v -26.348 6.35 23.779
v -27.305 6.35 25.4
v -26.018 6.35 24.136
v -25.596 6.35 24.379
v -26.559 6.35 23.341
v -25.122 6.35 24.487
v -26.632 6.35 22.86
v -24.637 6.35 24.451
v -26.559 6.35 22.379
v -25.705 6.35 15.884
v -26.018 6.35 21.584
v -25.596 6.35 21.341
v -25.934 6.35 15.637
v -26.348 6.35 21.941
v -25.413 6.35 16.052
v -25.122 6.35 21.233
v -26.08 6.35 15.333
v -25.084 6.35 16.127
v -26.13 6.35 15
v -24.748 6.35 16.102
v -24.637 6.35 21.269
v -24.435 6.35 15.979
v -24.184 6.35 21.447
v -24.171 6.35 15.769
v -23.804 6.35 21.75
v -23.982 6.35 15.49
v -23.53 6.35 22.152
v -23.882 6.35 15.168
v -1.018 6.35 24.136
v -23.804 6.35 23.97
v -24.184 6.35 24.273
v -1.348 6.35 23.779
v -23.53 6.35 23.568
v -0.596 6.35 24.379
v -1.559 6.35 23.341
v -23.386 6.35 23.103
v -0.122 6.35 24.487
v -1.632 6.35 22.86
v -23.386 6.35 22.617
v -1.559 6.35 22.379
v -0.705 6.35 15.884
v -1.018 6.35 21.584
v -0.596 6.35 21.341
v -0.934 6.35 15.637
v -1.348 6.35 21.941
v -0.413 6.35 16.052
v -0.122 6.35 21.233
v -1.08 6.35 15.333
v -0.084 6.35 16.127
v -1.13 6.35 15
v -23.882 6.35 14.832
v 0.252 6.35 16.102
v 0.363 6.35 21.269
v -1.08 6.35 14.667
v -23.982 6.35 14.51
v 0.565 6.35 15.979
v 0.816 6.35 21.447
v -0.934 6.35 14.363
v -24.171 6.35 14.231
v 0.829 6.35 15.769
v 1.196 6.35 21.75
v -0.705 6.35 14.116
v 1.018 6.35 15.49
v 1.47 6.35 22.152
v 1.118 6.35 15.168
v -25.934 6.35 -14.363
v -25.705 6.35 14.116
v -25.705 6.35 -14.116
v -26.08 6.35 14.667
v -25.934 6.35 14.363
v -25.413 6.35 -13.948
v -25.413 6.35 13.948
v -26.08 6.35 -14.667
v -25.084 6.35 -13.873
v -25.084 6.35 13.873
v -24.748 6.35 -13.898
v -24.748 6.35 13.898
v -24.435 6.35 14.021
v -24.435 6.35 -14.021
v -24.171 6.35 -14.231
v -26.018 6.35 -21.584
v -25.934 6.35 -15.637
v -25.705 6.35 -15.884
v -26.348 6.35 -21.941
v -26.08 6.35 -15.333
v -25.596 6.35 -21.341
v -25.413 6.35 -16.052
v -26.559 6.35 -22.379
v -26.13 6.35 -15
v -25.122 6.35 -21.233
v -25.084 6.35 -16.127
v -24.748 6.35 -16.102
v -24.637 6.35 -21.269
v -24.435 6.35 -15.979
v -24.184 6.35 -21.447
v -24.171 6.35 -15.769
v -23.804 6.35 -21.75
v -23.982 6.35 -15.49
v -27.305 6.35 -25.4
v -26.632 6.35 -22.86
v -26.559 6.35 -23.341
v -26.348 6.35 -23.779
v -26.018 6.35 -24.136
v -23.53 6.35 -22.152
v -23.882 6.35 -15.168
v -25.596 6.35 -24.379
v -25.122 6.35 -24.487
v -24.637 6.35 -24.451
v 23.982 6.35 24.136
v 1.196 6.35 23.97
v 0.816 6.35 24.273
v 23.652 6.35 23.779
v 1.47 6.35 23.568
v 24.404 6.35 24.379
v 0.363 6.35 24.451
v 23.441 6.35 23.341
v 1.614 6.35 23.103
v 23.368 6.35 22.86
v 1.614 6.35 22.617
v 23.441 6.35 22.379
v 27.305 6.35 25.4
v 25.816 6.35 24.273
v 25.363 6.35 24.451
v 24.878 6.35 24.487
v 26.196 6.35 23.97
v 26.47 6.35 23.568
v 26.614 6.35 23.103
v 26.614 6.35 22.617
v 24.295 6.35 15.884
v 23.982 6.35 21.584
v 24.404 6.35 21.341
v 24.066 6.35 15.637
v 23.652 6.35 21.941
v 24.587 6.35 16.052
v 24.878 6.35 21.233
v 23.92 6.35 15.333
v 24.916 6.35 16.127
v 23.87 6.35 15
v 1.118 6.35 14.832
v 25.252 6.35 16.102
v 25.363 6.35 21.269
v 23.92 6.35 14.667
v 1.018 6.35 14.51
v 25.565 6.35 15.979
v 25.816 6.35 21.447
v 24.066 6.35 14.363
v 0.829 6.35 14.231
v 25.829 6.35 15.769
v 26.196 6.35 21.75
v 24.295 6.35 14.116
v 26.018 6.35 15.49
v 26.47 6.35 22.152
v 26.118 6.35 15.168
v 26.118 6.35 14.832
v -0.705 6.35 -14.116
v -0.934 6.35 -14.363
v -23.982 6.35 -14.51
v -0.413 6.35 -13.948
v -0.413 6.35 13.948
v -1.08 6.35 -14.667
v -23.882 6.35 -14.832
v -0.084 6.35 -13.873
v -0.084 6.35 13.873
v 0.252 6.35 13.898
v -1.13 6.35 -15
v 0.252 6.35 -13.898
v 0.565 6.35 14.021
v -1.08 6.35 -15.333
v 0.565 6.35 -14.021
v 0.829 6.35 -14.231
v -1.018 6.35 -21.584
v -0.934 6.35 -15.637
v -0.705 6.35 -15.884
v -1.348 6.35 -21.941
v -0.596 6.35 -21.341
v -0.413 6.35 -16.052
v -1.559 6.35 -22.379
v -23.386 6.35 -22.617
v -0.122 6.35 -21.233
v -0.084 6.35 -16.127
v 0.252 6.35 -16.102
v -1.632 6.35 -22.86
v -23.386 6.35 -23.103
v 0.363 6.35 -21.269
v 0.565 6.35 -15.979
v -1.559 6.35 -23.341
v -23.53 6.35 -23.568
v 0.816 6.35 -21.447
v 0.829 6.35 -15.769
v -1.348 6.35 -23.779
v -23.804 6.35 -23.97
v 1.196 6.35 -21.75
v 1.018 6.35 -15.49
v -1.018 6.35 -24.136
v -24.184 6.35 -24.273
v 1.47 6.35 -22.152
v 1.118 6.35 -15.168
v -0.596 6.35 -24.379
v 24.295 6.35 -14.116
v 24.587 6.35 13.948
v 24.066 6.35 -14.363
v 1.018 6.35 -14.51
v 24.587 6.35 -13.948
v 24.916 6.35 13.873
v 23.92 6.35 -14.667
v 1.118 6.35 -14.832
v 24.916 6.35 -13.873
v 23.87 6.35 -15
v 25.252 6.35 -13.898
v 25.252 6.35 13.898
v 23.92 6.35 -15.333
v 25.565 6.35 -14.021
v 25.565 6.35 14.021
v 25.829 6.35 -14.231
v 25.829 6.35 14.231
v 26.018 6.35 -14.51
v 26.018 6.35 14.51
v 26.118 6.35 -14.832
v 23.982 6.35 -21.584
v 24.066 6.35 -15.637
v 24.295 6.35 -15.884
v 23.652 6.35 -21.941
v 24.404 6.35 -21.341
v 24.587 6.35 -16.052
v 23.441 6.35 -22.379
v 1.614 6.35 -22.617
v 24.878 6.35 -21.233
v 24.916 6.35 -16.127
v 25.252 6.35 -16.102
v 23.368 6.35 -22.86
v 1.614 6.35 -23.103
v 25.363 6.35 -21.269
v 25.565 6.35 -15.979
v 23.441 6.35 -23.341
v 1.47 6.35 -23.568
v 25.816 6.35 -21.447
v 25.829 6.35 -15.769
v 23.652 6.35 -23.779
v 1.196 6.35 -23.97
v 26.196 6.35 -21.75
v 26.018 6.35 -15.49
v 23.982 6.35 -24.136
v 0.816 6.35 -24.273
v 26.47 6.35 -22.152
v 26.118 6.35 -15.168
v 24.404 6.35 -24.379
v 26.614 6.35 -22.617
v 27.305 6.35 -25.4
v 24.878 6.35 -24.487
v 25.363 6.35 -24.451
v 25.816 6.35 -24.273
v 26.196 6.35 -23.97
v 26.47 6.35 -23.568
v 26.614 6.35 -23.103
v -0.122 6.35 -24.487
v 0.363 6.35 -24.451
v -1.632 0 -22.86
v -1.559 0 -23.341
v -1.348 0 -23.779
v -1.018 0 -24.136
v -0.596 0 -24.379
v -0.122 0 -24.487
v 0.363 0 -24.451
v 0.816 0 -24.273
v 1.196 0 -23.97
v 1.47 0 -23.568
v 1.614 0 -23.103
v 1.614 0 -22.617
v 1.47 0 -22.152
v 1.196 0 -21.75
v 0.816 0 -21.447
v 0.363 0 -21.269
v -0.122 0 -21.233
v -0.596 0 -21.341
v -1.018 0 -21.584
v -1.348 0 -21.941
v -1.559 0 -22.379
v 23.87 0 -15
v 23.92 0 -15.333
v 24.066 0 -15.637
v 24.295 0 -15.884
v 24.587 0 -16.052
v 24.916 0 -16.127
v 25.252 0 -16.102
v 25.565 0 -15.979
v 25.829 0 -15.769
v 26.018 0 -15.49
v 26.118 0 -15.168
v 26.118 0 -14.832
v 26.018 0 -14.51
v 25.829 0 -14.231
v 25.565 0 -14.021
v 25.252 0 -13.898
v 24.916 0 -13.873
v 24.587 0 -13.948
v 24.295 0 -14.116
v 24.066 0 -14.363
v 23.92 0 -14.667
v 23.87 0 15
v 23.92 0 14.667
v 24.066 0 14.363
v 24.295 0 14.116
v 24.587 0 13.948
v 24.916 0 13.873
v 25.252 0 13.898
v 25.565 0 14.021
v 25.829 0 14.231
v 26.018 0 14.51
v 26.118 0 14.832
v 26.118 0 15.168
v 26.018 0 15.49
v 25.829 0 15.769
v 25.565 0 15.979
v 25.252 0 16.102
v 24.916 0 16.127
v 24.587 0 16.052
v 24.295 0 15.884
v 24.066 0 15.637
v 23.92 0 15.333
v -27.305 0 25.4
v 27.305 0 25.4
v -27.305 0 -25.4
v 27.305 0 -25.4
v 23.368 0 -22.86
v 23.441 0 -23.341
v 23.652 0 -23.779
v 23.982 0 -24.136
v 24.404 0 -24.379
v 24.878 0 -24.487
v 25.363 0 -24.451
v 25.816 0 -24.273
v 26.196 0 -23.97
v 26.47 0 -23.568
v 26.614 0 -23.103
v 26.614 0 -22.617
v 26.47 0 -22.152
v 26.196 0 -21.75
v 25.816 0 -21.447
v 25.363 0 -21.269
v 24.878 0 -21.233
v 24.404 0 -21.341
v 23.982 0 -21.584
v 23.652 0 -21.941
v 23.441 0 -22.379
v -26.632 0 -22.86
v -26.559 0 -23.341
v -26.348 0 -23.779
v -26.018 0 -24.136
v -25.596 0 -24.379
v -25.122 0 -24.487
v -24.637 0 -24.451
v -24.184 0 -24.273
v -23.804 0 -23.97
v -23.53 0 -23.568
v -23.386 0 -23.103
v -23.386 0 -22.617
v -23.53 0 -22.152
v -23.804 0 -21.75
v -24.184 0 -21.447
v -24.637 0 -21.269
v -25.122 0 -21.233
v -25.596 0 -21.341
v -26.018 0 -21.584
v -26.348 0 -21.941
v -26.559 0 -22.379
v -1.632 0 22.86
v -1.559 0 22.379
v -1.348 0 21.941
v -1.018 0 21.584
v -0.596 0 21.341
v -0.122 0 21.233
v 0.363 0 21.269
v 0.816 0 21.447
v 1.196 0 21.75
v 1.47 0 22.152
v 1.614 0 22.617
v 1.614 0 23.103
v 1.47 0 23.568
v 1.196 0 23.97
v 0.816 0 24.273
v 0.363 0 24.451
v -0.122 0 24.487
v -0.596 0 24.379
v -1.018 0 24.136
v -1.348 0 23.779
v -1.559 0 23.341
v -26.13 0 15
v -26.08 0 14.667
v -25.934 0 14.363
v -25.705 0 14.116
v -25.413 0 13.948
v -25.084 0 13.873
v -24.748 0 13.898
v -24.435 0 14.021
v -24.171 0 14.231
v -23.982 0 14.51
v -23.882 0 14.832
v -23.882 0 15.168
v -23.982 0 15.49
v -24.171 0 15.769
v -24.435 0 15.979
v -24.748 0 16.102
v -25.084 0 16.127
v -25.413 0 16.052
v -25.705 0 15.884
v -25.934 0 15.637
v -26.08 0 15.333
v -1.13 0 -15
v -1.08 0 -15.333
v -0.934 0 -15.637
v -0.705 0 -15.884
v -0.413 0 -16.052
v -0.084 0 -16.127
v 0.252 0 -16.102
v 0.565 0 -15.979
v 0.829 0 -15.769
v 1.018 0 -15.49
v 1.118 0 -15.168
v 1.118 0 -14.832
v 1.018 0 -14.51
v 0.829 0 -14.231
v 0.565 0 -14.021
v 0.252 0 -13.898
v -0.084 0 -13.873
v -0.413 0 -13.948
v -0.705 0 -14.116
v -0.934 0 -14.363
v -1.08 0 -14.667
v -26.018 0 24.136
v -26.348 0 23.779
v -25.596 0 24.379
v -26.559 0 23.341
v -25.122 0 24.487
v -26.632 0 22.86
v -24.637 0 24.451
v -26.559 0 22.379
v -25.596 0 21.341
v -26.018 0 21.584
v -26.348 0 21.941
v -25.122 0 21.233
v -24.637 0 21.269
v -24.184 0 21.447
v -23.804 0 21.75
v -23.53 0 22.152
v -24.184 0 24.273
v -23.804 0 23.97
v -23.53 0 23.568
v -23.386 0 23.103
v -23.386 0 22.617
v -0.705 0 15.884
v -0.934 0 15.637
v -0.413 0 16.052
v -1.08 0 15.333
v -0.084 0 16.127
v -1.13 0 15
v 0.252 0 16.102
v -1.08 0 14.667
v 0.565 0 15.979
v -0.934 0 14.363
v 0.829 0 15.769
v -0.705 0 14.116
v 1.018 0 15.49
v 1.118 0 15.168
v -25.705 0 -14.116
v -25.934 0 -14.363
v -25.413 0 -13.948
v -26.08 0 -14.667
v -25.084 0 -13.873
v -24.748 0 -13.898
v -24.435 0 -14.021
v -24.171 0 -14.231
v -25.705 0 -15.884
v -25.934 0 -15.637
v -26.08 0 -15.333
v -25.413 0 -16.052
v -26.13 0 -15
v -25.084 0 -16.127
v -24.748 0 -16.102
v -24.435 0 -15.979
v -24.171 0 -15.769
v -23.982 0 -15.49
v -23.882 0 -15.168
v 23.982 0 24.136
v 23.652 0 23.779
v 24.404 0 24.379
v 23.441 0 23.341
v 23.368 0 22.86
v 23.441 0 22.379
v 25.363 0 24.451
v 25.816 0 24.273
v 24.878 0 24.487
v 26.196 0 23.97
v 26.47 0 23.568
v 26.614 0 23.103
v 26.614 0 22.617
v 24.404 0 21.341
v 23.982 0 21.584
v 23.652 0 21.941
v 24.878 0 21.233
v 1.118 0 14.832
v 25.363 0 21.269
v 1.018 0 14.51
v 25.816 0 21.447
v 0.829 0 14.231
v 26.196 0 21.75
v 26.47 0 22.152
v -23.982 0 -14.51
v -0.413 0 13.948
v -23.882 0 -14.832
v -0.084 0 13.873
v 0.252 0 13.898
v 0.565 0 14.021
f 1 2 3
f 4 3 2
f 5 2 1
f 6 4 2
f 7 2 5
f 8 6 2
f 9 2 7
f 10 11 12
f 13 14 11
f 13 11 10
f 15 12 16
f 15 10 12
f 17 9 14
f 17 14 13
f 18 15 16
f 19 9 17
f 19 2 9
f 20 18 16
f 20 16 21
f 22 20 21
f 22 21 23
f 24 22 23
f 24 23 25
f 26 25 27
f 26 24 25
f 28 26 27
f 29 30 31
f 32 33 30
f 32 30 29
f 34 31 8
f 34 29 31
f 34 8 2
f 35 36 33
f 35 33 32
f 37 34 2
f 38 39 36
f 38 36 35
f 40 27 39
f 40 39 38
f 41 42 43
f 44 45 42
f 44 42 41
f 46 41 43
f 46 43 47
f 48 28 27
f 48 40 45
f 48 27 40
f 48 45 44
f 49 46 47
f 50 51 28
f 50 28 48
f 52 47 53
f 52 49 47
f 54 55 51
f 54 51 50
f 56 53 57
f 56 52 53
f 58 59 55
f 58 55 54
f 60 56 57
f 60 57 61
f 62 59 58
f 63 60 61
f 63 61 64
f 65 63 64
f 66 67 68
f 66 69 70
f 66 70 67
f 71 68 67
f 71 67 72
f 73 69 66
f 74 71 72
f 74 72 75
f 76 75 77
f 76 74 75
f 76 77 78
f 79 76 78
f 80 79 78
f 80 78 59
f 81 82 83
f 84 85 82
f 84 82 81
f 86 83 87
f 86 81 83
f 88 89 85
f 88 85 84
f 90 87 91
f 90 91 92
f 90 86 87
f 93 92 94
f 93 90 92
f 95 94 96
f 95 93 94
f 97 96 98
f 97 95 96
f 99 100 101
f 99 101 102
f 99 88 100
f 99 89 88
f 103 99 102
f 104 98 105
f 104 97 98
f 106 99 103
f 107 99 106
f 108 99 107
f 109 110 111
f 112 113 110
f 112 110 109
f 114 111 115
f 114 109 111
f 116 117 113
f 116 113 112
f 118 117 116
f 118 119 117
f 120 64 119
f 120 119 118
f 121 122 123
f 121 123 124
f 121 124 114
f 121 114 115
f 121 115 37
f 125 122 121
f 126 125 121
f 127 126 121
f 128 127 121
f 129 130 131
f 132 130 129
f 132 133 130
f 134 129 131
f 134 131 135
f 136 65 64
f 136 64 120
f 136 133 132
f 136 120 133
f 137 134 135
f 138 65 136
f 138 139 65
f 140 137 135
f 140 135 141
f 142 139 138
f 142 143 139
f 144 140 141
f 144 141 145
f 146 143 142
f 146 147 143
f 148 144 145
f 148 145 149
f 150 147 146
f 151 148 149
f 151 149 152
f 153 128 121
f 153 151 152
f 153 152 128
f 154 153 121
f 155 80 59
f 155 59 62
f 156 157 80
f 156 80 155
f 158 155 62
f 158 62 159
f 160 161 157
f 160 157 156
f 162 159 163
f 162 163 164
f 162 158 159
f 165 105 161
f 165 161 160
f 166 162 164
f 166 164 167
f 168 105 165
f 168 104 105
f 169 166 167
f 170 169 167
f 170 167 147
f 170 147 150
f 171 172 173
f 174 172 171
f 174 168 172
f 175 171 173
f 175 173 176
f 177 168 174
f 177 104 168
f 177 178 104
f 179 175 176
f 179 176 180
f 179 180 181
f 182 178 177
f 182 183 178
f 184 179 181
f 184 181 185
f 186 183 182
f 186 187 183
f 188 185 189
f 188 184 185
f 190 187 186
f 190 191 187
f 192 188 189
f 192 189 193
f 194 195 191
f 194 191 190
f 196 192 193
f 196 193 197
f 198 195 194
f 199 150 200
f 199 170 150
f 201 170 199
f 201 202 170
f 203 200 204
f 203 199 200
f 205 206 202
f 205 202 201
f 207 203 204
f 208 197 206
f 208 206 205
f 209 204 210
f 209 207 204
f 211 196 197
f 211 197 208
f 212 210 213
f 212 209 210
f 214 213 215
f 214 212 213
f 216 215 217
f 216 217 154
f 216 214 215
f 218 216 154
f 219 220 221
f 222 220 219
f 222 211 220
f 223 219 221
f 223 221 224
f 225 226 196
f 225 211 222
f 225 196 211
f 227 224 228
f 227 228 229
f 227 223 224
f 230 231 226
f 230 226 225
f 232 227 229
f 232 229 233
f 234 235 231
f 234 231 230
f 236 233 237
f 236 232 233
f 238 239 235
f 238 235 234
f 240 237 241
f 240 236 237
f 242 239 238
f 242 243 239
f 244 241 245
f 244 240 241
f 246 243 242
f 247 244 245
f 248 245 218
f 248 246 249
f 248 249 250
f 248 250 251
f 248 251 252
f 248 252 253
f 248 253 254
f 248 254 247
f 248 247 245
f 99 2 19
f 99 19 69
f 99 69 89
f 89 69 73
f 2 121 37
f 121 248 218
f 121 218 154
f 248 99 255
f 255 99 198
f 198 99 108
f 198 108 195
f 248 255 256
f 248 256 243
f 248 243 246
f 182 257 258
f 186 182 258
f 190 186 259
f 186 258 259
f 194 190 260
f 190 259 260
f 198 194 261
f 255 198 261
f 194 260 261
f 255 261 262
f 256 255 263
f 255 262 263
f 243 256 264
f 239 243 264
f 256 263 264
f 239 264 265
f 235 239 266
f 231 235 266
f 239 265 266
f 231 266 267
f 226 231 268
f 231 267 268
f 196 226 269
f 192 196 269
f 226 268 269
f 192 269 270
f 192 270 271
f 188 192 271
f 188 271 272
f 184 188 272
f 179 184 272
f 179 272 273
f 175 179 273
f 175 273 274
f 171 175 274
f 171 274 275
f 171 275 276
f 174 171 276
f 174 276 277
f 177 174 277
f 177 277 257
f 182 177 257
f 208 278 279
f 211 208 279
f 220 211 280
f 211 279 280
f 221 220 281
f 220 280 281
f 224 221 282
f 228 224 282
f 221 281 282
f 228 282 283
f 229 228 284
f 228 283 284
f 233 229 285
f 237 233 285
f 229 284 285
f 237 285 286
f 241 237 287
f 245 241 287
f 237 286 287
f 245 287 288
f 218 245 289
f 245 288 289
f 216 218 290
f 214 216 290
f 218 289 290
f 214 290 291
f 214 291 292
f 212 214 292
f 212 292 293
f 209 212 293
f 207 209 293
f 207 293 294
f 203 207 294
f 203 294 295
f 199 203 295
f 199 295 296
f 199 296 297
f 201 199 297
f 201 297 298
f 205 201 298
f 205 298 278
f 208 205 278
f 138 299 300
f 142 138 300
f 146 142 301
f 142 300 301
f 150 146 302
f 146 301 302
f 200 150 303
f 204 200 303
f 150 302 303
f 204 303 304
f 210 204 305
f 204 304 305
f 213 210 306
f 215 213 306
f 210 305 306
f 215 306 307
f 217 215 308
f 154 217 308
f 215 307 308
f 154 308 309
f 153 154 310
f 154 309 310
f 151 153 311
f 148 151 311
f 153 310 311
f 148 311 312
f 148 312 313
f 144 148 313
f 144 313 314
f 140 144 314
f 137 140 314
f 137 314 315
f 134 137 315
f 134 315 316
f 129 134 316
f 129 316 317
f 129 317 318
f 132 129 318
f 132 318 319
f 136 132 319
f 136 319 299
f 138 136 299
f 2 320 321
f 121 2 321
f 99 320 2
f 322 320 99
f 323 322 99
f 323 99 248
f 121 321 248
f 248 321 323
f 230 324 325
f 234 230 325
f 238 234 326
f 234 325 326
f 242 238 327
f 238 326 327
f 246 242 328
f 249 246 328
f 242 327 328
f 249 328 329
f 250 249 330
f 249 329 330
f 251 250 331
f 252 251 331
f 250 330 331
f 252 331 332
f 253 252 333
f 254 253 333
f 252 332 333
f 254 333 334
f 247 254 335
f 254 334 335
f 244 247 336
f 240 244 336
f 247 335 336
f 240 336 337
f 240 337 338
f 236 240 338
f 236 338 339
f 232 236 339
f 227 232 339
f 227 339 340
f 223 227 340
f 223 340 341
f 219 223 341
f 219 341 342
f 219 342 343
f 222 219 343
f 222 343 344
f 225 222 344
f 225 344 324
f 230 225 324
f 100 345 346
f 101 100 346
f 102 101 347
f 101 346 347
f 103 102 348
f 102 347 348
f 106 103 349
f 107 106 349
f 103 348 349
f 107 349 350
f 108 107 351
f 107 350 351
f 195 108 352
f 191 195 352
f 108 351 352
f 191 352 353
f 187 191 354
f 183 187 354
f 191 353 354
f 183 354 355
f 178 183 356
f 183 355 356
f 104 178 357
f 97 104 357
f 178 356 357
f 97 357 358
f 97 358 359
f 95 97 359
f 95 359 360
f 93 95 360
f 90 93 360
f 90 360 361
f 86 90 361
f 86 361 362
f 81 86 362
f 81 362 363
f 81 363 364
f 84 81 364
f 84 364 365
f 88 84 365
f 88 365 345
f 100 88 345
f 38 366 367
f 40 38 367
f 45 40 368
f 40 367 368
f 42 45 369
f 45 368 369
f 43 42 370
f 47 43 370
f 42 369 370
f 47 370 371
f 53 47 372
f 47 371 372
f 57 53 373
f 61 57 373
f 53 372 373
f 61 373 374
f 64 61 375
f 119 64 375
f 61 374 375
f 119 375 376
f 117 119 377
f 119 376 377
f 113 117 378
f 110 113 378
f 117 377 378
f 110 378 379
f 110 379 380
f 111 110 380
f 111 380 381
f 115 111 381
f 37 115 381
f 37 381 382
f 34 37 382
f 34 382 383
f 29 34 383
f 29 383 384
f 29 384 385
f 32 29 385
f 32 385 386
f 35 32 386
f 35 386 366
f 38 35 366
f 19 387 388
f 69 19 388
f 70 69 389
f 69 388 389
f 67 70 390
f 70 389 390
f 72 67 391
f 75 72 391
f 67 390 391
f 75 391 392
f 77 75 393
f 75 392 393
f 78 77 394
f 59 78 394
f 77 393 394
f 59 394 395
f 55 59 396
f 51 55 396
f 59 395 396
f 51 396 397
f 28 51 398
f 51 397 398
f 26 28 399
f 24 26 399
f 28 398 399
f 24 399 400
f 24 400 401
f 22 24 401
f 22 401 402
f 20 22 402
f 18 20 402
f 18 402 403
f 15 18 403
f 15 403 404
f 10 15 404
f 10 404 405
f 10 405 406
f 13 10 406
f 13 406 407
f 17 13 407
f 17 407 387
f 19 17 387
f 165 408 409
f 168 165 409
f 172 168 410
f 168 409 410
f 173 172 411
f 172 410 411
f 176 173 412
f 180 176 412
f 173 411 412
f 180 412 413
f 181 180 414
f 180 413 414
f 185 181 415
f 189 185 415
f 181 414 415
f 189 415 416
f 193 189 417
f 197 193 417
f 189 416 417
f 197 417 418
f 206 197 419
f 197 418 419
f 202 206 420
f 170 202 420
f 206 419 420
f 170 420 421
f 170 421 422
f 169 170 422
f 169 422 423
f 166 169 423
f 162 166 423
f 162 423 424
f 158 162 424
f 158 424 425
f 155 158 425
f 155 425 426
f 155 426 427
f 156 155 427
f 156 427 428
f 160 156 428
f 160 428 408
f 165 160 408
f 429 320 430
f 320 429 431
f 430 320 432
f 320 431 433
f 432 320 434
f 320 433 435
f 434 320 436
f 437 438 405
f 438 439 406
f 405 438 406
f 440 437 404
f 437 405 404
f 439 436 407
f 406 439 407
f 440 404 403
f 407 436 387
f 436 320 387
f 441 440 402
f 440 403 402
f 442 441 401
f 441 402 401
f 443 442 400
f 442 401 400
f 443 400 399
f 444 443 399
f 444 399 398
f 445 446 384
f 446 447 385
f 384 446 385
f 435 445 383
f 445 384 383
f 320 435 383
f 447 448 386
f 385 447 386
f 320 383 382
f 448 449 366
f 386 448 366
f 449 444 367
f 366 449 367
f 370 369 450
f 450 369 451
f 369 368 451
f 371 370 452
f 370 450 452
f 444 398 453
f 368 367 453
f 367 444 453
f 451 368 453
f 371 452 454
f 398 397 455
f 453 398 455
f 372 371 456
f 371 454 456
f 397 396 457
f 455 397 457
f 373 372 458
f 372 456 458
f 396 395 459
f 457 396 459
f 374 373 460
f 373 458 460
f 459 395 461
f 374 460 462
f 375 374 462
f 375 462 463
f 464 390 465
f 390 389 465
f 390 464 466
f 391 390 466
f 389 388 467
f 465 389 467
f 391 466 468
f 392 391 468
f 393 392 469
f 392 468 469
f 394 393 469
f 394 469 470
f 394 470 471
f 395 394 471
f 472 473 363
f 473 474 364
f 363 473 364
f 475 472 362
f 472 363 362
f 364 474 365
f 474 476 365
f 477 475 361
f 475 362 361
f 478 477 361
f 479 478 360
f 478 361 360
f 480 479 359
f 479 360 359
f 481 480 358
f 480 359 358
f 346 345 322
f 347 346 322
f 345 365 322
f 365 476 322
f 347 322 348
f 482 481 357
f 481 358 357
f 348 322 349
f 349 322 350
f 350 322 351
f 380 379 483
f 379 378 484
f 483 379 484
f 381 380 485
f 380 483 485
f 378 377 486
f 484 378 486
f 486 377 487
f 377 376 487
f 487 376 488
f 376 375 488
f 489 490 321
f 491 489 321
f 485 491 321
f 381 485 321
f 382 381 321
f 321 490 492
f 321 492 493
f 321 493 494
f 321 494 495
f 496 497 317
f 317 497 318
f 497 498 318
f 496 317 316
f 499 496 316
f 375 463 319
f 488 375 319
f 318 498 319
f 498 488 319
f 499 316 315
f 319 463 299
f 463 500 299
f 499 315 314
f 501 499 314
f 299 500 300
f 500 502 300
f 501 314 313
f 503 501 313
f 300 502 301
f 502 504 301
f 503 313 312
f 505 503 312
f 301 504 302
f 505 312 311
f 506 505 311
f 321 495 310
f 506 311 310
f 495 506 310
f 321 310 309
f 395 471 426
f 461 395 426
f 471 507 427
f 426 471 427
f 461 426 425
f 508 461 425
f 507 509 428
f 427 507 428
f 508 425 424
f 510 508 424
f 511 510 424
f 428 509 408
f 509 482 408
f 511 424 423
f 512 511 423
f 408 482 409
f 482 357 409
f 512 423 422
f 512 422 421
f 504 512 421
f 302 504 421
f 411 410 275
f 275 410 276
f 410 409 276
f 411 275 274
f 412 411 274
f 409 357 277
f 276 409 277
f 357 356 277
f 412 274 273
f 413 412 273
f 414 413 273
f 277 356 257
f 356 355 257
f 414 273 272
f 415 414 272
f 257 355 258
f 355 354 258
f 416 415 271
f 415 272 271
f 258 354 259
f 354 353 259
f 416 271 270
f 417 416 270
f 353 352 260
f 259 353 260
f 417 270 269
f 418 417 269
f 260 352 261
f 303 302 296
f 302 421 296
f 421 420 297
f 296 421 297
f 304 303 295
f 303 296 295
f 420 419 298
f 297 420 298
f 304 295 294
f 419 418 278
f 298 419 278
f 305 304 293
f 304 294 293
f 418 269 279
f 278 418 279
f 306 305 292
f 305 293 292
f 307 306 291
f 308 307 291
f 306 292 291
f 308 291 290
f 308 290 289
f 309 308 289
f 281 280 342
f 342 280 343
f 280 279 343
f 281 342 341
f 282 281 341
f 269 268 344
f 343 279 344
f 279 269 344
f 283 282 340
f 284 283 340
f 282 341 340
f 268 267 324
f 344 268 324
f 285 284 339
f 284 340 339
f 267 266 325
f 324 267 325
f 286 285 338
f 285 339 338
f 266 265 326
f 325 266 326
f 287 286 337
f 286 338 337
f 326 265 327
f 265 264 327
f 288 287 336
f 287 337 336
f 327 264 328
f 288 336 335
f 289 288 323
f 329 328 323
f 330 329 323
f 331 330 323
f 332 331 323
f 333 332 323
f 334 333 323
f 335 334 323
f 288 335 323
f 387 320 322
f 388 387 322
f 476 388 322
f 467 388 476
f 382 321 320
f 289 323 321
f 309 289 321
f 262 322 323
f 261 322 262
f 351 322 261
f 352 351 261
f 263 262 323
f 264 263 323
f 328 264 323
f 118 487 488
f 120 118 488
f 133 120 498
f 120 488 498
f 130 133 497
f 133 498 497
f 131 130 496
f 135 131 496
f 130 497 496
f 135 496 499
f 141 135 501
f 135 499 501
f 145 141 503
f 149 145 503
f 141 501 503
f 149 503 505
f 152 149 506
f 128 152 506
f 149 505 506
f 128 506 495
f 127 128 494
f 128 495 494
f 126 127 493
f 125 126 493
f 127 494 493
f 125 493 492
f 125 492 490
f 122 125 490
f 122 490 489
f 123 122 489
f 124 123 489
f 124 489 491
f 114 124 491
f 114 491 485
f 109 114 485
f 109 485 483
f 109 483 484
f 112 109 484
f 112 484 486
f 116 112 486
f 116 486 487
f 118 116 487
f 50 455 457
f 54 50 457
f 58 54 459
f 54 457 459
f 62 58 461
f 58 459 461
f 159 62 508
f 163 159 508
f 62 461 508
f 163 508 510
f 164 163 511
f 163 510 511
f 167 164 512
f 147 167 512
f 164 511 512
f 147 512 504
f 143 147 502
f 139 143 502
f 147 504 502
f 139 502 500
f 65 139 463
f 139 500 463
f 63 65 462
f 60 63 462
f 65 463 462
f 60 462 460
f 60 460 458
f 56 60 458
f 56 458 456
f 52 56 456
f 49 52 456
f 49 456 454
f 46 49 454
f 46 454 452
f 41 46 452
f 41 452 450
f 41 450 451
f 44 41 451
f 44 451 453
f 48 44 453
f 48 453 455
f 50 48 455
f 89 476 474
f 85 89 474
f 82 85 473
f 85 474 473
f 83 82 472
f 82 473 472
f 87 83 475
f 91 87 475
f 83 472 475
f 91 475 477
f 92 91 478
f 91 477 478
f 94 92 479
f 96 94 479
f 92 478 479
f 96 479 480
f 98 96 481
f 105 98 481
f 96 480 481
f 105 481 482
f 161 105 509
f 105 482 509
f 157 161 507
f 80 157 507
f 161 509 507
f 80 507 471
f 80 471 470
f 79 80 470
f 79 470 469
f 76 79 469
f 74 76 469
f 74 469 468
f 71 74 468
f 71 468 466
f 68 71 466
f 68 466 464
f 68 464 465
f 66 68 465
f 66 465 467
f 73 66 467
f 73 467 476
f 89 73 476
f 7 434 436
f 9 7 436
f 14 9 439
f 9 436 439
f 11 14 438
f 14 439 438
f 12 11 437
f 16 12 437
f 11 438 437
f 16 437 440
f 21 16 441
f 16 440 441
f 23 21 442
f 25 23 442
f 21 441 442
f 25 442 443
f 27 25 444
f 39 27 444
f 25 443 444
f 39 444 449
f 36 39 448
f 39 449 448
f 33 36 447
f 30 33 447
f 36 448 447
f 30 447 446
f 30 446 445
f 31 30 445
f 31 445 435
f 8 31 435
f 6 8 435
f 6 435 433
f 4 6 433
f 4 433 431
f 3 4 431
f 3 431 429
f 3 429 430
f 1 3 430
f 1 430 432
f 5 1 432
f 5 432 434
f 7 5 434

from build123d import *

# Parameters (mm, degrees)
SKETCH1_W                 = 54.61
SKETCH1_H                 = 50.8
BOSS_EXTRUDE1_DEPTH       = 6.35
F_4_40_TAPPED_HOLE1_D     = 2.2606
F_4_40_TAPPED_HOLE1_DEPTH = 6.35
F_4_CLEARANCE_HOLE1_D     = 3.2639
F_4_CLEARANCE_HOLE1_DEPTH = 6.35


with BuildPart() as part:
    # Sketch1 → Boss-Extrude1 (new body)
    with BuildSketch(Plane(origin=(0, 0, 0), x_dir=(1, 0, 0), z_dir=(0, 1, 0))):
        Rectangle(SKETCH1_W, SKETCH1_H)
    extrude(amount=BOSS_EXTRUDE1_DEPTH)

    # #4-40 Tapped Hole1
    with Locations(Plane(origin=(0, 6.35, 0), x_dir=(1, 0, 0), z_dir=(0, 1, 0))):
        with Locations((-25, 15), (8e-07, 15), (25.0000016, 15), (8e-07, -14.9999908), (25.0000016, -14.9999908), (-25, -14.9999908)):
            Hole(F_4_40_TAPPED_HOLE1_D / 2, depth=F_4_40_TAPPED_HOLE1_DEPTH)

    # #4 Clearance Hole1
    with Locations(Plane(origin=(0, 6.35, 0), x_dir=(1, 0, 0), z_dir=(0, 1, 0))):
        with Locations((-25, 22.86), (0, 22.86), (25, 22.86), (0, -22.86), (25, -22.86), (-25, -22.86)):
            Hole(F_4_CLEARANCE_HOLE1_D / 2, depth=F_4_CLEARANCE_HOLE1_DEPTH)


solid = part.part
